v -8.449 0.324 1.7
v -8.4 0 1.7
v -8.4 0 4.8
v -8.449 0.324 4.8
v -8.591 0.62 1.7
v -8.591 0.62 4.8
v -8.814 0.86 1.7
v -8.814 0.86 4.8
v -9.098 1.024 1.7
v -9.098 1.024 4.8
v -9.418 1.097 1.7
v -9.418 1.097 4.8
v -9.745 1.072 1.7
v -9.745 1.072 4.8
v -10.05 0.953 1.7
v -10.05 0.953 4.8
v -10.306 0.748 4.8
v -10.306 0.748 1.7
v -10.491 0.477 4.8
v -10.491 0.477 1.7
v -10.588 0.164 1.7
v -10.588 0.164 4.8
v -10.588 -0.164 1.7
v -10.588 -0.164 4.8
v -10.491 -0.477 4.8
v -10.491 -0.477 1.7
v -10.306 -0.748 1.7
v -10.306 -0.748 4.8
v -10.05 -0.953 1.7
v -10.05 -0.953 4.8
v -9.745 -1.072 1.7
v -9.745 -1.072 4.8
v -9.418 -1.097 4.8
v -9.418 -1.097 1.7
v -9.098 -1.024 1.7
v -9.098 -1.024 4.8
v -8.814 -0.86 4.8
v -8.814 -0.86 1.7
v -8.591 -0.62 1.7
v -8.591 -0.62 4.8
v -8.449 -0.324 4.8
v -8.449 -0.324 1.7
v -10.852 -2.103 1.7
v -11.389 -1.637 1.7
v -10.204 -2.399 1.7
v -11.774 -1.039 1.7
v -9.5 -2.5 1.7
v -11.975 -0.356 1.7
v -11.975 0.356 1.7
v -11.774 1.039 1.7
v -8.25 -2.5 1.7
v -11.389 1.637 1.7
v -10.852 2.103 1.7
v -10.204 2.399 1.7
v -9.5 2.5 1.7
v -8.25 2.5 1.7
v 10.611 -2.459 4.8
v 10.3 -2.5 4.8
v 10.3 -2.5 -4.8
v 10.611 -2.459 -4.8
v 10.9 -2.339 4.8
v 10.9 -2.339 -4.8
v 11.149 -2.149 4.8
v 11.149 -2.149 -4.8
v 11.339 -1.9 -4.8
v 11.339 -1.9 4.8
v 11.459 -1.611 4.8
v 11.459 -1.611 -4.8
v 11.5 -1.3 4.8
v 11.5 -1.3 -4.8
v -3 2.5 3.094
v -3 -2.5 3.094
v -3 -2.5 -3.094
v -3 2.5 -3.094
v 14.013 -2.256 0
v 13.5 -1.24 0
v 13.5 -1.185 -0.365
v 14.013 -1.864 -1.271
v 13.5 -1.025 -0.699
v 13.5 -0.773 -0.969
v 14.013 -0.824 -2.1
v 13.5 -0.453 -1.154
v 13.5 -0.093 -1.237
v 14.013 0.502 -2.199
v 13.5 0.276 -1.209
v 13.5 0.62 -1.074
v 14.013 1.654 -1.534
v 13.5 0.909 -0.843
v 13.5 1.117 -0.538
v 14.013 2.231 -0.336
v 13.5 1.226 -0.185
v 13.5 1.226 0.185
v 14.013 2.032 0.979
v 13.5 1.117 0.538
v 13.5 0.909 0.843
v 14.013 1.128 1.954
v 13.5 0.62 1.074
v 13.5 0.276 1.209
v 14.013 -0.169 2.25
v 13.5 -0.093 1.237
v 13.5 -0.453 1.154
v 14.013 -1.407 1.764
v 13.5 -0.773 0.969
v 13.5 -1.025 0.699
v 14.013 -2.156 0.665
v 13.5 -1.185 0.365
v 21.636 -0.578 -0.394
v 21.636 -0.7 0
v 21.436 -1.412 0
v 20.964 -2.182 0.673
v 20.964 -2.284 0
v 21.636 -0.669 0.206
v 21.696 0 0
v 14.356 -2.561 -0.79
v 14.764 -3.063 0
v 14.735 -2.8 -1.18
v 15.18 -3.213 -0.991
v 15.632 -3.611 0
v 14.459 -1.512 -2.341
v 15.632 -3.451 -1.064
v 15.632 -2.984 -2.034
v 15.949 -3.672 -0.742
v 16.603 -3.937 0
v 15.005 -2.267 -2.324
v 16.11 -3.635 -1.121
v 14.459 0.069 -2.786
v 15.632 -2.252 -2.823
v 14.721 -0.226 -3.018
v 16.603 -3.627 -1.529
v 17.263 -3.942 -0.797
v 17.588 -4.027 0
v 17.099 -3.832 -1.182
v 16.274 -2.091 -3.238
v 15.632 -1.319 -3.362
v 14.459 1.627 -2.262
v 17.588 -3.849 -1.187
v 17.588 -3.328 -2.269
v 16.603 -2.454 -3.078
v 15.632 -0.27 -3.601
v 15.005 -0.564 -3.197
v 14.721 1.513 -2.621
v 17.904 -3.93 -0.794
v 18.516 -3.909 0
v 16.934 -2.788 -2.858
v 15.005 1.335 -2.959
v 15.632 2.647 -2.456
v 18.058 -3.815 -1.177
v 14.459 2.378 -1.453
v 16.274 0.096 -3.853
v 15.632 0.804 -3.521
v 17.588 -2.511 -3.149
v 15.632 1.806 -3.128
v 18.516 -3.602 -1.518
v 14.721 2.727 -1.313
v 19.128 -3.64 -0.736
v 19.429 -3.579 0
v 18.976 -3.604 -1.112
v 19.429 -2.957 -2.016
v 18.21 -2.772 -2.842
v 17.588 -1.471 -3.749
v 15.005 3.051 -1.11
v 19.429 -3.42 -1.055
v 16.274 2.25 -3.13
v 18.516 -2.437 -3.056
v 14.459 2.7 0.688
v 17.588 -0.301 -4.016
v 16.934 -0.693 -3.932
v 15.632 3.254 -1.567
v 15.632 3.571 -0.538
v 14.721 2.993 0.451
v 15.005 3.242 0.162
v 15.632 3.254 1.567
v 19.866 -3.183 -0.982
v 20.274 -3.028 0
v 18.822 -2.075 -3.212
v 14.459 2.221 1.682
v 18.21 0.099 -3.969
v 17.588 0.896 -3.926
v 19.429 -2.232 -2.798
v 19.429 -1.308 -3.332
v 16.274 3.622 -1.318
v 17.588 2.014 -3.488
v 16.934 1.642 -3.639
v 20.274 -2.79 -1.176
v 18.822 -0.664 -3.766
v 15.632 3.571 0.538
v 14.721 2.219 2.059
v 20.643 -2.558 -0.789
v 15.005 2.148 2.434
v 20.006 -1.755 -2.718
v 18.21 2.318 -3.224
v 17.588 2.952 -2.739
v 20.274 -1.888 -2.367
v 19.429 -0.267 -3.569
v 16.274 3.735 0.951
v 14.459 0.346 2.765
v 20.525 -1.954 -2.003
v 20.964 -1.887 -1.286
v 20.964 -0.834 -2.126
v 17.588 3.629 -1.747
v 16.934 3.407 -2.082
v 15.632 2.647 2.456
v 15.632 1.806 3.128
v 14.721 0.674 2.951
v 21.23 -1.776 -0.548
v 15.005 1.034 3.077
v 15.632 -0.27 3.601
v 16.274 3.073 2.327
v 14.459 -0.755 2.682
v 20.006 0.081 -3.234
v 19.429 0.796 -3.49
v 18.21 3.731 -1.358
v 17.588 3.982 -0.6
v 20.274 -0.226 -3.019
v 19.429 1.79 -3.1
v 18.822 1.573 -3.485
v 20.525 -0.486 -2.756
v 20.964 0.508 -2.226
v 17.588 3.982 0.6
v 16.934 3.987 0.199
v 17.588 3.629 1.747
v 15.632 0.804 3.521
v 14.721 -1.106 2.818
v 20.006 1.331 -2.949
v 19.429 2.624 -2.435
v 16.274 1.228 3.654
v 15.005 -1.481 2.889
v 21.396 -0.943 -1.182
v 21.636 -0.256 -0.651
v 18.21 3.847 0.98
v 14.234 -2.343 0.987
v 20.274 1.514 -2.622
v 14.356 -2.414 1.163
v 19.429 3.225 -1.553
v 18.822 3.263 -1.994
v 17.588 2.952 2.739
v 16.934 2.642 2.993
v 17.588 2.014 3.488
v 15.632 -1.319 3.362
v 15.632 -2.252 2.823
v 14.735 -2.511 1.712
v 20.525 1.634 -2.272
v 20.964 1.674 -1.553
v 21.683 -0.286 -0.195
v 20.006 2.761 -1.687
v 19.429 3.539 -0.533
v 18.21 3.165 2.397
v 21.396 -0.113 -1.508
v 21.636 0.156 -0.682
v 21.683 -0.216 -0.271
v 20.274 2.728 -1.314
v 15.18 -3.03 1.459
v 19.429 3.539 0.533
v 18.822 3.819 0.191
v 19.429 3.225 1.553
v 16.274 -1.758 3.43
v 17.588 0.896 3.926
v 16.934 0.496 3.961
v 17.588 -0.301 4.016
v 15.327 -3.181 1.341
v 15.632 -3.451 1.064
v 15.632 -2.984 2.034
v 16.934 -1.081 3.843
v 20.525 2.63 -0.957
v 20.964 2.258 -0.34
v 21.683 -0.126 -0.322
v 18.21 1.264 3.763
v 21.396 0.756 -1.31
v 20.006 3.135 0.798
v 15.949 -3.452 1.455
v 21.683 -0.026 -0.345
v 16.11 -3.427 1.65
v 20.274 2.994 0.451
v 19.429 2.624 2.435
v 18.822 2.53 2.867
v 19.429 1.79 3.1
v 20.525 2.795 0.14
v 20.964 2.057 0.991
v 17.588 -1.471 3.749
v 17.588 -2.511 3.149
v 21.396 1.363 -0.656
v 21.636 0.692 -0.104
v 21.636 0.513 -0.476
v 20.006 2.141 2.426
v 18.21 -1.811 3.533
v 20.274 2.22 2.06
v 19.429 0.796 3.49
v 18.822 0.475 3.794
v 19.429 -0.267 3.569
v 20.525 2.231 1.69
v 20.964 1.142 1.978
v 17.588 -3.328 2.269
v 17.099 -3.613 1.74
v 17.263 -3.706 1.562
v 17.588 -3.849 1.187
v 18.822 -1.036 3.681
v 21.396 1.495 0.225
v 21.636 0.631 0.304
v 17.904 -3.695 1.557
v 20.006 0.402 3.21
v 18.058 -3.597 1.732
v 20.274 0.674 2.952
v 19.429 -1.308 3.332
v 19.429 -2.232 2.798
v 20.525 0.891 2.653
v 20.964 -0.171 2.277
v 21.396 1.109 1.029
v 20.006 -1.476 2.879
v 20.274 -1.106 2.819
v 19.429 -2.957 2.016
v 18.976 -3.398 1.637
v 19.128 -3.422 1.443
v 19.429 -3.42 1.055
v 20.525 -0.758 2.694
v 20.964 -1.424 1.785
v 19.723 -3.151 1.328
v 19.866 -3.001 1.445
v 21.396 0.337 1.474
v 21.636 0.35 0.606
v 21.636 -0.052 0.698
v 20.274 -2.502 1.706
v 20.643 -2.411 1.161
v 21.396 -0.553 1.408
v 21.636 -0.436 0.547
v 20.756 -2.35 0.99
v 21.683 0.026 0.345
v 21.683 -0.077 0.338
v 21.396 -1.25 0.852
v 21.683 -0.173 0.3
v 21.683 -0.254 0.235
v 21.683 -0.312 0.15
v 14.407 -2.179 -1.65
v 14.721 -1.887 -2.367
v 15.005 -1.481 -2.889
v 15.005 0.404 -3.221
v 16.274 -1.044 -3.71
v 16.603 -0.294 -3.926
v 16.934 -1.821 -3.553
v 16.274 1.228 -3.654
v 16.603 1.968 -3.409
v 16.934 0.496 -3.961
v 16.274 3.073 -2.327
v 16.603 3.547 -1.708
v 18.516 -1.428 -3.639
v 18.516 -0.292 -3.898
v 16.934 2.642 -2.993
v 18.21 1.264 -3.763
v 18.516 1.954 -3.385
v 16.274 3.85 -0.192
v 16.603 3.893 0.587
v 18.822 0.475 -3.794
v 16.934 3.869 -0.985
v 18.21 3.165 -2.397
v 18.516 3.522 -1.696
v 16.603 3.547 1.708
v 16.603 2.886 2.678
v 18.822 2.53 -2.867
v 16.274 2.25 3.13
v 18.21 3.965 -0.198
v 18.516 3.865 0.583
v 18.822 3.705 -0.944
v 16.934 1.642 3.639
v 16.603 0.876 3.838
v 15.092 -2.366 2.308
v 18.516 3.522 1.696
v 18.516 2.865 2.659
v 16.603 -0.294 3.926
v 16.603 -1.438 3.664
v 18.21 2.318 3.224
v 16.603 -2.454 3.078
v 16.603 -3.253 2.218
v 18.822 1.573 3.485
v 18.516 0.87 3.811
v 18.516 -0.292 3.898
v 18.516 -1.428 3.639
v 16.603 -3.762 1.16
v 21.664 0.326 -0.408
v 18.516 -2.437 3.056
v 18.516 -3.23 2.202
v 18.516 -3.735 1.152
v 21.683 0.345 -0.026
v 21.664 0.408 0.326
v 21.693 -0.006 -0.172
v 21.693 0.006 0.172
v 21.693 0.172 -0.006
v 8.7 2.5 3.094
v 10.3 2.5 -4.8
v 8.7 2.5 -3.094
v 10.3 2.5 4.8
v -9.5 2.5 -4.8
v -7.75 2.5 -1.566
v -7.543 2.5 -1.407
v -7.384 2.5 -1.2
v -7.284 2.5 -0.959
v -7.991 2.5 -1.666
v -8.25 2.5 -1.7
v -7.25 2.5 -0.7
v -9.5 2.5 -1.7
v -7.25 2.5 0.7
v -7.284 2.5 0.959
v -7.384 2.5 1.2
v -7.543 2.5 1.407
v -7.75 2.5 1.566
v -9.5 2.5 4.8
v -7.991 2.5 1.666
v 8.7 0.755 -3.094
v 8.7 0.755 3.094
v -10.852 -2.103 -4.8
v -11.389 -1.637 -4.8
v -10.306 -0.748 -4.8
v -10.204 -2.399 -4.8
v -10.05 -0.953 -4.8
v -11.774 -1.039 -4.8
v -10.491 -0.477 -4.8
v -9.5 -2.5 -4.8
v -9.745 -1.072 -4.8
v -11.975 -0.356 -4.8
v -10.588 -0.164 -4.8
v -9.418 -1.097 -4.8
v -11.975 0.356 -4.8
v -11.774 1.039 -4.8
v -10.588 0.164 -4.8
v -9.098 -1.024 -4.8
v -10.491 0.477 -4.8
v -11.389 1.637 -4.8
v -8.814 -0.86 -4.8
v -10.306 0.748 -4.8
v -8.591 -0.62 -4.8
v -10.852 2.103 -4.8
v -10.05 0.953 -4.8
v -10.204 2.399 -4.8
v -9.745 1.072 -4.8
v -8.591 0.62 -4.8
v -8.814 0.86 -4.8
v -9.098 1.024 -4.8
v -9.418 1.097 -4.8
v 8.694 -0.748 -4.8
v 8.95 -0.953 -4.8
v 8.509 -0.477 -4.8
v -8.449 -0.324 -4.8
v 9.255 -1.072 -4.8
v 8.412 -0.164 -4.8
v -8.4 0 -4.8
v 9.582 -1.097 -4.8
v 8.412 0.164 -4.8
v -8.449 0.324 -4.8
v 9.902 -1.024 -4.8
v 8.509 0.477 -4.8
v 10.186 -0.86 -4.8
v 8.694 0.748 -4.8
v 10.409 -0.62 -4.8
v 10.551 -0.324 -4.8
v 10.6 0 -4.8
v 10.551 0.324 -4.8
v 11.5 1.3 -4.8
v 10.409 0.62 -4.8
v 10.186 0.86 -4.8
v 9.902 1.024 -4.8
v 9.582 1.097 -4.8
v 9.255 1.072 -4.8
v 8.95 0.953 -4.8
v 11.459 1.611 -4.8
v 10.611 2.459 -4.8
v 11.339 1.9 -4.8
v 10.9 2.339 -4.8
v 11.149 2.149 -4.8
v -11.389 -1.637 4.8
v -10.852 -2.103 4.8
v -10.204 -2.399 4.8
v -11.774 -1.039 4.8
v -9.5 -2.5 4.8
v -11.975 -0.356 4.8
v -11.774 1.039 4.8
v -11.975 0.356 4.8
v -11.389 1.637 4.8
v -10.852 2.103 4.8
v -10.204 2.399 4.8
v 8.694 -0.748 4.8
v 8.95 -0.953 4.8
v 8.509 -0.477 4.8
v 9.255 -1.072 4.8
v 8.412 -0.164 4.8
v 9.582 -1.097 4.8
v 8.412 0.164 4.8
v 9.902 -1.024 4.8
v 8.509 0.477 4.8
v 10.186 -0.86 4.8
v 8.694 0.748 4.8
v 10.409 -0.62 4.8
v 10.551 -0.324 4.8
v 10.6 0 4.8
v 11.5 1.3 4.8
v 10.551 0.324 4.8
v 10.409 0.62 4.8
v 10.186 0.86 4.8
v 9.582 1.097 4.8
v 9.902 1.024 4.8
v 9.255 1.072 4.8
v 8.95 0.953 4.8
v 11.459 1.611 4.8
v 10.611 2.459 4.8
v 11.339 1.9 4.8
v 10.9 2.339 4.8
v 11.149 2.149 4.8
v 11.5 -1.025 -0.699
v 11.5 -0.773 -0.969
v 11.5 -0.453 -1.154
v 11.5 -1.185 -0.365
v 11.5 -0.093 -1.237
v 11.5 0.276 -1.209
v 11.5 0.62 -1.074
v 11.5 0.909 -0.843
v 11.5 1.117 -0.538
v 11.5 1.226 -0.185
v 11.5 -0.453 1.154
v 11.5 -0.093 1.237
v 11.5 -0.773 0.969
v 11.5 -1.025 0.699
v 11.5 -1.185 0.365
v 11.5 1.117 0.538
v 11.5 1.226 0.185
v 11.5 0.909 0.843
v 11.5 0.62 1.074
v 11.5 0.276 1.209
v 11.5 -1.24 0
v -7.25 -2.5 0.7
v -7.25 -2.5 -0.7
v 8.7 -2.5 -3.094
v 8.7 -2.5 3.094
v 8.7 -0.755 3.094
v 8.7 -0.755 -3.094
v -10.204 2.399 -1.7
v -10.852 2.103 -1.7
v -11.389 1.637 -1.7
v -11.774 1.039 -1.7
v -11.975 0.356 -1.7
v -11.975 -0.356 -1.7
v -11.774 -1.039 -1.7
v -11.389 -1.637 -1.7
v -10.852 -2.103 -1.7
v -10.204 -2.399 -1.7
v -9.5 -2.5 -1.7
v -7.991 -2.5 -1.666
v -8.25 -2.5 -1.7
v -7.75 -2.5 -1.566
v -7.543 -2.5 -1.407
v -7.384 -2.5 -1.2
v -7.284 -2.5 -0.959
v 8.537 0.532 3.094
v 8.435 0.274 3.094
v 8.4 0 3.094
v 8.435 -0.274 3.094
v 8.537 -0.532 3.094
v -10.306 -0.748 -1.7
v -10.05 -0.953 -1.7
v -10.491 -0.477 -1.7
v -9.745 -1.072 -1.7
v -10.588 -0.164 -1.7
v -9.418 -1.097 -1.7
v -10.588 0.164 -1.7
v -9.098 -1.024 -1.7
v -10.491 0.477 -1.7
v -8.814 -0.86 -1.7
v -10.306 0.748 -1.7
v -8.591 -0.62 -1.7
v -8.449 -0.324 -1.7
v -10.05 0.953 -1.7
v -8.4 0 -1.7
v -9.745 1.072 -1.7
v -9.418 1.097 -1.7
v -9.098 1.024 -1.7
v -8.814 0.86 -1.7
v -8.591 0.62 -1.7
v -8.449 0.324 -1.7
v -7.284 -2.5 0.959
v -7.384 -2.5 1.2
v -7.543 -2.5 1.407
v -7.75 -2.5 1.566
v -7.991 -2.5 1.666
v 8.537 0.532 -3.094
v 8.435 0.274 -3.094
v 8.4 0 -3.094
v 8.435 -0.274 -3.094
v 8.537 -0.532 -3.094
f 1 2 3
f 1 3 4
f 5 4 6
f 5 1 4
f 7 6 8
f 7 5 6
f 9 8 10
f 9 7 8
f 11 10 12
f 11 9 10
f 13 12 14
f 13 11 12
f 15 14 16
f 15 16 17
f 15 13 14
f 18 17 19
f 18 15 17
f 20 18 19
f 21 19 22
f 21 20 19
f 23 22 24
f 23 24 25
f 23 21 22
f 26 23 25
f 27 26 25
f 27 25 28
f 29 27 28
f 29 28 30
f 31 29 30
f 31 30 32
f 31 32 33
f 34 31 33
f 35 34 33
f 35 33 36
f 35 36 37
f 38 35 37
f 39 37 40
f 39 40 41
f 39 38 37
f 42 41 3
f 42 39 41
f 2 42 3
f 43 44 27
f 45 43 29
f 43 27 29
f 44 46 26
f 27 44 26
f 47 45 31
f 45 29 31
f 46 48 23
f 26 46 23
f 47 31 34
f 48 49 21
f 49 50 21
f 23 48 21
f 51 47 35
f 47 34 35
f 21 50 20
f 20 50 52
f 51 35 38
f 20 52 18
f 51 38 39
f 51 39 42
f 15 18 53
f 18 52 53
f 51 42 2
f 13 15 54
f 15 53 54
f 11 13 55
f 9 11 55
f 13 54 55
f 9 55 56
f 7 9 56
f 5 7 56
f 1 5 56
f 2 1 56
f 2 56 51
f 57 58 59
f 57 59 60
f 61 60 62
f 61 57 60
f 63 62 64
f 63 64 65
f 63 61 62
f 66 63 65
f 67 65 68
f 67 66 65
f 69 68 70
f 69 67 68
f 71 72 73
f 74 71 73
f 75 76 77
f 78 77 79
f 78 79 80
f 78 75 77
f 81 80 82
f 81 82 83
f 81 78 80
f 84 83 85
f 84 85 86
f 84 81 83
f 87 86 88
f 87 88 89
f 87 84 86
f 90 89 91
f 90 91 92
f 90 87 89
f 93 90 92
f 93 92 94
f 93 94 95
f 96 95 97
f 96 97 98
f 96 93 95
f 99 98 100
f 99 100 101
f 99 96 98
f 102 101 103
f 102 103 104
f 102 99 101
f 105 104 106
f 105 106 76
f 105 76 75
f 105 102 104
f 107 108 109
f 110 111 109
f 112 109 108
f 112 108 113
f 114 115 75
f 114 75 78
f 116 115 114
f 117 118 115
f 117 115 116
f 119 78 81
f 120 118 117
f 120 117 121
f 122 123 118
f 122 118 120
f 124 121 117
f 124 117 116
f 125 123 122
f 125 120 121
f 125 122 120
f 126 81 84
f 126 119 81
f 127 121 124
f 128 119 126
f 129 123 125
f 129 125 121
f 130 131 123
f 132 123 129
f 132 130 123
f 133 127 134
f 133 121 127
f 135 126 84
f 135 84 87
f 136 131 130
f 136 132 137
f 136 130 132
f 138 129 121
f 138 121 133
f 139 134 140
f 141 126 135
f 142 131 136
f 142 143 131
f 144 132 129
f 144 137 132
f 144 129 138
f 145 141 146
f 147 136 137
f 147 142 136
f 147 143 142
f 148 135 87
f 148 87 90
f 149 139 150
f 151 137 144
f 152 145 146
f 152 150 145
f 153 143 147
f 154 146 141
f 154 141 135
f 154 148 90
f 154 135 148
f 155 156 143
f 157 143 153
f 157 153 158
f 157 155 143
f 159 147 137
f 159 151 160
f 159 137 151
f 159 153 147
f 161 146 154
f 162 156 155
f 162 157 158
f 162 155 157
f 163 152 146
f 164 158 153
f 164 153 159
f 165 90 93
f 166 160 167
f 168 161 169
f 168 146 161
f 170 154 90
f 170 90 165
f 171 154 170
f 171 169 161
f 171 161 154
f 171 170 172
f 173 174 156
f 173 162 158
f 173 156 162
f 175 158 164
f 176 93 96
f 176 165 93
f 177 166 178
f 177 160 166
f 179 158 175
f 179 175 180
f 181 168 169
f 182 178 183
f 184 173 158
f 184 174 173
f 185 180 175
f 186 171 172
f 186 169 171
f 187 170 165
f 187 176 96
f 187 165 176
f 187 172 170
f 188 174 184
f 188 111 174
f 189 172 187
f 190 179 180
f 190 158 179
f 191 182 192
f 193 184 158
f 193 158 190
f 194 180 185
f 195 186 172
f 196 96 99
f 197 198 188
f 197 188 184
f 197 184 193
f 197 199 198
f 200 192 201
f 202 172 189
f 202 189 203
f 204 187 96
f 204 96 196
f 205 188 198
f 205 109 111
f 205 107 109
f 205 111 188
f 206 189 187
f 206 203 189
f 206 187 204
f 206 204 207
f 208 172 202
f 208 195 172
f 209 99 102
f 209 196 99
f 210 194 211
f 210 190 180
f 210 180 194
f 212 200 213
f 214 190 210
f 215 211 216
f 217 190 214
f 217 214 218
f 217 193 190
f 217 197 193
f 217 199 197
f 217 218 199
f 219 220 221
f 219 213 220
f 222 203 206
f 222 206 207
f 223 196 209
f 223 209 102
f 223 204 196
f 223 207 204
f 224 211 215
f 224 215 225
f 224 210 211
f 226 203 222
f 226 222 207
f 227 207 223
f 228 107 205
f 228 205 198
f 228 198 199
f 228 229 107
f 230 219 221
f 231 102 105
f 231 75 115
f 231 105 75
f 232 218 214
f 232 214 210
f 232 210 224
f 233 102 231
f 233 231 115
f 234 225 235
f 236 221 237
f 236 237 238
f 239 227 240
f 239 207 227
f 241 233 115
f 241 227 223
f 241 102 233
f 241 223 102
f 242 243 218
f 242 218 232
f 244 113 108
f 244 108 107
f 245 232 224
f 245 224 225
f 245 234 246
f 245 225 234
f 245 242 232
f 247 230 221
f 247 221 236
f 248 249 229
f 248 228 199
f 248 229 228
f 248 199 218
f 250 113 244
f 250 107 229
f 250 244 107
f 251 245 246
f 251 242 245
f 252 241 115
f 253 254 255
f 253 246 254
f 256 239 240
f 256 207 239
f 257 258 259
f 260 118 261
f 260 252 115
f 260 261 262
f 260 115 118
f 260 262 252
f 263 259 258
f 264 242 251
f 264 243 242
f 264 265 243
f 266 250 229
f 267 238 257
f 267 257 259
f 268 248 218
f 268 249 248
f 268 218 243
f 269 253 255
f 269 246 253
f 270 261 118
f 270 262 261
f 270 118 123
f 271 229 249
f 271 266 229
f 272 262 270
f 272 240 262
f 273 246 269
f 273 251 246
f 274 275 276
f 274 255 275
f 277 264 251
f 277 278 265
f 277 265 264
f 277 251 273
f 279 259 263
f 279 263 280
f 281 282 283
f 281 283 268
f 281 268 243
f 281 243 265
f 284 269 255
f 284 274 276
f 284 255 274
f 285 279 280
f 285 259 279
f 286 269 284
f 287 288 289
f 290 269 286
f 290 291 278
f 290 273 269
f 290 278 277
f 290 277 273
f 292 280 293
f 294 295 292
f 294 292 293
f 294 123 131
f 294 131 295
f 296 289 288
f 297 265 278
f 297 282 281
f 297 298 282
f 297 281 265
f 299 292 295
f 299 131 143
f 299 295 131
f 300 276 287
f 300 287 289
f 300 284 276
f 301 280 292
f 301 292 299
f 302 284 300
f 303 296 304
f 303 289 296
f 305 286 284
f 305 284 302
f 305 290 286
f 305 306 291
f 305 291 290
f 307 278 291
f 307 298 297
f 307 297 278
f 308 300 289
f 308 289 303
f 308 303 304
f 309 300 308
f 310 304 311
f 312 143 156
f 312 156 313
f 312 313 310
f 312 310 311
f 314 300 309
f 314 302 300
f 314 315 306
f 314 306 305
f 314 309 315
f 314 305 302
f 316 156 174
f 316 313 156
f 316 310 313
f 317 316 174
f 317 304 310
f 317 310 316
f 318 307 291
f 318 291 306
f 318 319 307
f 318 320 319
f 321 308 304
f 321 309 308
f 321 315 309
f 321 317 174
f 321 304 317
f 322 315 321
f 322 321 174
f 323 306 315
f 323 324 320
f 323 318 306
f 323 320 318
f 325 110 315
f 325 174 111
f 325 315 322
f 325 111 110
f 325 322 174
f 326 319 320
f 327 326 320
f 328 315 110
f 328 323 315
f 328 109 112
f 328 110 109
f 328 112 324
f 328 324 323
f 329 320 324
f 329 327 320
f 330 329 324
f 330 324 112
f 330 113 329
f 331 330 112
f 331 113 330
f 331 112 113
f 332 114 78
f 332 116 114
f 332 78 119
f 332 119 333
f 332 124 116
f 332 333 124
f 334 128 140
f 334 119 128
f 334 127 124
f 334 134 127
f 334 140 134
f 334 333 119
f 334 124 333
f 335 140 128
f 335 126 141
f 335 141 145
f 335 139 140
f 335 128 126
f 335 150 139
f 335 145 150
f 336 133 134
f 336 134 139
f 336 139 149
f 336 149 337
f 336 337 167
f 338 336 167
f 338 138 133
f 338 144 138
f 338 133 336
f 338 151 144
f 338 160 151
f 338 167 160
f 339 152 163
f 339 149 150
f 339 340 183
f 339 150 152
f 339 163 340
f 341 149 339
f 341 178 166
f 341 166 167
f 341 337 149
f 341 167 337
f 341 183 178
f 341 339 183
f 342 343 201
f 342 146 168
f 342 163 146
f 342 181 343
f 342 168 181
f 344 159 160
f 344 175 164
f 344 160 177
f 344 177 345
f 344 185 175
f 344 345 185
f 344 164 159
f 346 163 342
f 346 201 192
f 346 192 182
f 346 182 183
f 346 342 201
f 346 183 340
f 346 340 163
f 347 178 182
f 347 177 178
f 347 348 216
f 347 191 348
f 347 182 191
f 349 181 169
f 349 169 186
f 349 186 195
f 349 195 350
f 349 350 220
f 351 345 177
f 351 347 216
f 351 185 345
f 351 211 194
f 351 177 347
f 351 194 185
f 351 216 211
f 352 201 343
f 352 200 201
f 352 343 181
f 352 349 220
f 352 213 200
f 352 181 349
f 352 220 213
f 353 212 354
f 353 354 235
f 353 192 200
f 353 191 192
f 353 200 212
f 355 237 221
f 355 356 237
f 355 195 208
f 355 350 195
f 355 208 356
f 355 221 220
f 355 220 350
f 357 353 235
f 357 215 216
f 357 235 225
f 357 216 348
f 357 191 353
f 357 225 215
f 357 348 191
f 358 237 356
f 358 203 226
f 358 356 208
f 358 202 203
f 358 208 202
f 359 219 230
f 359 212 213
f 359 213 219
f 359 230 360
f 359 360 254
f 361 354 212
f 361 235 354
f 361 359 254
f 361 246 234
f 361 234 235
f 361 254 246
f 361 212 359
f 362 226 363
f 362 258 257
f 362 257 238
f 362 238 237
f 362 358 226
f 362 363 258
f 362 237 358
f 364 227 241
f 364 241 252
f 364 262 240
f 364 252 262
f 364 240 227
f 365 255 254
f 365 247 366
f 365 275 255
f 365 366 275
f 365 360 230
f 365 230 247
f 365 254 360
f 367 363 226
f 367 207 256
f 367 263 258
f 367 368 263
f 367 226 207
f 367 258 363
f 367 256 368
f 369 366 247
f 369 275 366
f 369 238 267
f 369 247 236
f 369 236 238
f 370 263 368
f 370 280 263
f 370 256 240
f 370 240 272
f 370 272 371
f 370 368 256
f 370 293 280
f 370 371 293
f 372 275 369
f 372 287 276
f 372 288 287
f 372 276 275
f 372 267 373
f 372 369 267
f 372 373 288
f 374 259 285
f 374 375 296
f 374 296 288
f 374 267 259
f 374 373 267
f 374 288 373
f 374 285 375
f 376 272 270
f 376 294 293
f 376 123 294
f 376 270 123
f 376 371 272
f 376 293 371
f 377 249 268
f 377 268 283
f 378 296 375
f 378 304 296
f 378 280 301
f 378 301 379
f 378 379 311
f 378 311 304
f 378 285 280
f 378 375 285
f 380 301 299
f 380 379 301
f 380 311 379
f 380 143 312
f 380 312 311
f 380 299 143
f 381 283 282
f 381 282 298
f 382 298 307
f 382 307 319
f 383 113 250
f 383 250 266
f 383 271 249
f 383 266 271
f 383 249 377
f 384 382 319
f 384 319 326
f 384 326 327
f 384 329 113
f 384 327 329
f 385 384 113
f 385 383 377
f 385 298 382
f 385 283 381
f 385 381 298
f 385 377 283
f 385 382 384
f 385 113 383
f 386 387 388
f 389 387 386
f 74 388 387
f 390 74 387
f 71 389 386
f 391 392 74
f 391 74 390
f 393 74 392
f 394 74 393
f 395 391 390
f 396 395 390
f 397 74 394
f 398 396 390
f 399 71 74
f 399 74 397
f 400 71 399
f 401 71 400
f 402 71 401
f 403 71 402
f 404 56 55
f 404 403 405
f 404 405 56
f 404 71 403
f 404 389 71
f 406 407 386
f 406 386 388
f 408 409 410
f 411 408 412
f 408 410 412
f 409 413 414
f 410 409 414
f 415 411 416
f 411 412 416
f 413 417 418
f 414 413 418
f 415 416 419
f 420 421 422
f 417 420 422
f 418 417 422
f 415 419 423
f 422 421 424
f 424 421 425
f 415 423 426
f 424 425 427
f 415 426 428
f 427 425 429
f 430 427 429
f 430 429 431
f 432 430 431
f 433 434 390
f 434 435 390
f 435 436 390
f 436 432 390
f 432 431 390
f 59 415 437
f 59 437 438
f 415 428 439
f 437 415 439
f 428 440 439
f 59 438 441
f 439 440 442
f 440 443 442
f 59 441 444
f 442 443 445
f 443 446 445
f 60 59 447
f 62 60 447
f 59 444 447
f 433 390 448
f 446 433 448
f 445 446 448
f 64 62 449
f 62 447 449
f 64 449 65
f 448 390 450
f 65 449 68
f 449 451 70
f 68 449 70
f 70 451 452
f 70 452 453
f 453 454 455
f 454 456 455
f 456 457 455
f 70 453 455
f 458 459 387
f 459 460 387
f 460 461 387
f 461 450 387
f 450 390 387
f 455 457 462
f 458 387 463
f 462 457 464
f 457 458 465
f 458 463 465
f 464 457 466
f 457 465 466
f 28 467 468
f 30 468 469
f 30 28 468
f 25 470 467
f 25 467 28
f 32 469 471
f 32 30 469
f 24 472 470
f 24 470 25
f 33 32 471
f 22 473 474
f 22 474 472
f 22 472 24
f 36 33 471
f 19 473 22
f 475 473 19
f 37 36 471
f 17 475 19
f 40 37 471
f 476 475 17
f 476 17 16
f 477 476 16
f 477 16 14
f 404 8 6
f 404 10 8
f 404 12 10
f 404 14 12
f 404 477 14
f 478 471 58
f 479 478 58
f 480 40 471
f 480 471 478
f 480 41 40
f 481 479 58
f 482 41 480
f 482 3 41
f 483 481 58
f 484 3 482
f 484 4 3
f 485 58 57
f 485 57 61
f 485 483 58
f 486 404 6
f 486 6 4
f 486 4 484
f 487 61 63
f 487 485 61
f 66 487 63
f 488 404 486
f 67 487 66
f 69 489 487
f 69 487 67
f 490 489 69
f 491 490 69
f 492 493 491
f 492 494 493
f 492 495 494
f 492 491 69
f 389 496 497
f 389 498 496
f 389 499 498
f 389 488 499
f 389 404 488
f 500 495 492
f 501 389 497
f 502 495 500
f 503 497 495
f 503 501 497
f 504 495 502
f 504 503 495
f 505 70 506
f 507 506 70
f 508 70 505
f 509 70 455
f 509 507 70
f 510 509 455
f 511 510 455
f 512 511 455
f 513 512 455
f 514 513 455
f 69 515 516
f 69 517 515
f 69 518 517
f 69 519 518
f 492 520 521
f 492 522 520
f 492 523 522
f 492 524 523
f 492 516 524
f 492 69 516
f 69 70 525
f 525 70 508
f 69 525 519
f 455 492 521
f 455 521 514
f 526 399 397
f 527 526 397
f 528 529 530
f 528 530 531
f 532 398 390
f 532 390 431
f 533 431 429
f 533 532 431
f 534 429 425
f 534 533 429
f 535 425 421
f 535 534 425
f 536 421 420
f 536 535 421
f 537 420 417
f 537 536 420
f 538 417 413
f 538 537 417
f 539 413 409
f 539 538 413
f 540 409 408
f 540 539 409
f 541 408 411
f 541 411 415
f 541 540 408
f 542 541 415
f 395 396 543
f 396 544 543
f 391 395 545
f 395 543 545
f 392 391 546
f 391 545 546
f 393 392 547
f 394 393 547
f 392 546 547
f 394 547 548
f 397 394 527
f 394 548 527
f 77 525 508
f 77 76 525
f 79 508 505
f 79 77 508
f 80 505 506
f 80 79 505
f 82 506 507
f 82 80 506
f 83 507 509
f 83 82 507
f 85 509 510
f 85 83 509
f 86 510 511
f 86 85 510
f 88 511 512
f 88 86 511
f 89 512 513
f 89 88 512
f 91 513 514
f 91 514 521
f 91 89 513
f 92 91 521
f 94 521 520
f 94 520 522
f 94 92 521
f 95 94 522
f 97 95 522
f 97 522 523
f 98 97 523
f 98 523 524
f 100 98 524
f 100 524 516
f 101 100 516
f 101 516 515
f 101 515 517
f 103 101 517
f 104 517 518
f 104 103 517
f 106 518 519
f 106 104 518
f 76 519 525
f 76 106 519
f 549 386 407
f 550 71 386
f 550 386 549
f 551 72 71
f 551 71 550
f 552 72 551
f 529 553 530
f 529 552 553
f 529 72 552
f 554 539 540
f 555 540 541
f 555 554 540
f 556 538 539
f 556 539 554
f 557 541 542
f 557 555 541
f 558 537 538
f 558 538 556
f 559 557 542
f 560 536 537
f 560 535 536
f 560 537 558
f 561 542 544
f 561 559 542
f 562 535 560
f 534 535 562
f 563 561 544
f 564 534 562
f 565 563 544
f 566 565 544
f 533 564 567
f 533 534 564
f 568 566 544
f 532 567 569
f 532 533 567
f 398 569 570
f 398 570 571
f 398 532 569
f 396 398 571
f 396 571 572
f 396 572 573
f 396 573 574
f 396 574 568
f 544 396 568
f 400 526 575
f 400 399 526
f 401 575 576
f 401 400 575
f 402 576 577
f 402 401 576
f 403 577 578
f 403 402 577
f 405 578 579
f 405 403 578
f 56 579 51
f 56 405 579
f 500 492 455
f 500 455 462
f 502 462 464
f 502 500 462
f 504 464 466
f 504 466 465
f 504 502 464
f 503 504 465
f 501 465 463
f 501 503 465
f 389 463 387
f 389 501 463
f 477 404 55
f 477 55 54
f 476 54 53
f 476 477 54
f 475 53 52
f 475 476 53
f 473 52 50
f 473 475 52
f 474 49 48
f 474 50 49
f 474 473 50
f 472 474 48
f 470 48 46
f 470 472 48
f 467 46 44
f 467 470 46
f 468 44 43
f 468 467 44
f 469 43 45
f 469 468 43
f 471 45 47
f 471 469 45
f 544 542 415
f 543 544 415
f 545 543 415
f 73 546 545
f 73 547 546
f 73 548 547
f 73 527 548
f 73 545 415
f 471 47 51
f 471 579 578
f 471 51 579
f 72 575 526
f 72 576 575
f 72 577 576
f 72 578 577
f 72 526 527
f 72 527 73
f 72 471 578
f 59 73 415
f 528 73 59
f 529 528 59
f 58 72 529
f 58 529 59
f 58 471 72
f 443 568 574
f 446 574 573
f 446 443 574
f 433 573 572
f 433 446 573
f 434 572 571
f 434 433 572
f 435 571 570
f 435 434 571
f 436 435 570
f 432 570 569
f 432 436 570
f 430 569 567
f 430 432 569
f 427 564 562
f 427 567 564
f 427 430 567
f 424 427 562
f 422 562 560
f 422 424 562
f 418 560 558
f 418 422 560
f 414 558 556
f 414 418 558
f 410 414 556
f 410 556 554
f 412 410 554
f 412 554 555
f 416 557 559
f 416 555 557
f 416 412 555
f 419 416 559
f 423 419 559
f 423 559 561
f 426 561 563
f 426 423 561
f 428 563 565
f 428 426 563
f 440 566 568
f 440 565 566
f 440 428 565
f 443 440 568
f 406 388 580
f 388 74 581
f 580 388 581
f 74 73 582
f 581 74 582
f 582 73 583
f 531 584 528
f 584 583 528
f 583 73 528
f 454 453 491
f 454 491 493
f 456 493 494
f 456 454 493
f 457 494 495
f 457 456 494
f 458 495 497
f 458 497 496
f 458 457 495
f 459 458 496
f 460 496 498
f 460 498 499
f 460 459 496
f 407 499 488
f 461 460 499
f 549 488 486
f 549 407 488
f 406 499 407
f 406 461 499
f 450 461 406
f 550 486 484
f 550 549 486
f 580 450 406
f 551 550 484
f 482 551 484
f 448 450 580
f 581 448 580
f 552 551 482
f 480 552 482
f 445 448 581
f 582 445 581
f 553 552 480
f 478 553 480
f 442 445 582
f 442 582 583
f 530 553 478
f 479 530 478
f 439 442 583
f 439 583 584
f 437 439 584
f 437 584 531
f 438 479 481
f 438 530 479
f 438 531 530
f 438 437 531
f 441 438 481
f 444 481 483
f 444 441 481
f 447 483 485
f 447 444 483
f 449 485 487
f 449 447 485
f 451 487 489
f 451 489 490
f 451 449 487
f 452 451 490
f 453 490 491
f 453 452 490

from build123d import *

# Parameters (mm, degrees)
SKETCH1_R           = 1.1
BOSS_EXTRUDE1_DEPTH = 4.8
SKETCH2_W           = 11.7
SKETCH2_H           = 6.188
SKETCH2_W_2         = 4.75
SKETCH2_H_2         = 3.4
CUT_EXTRUDE1_DEPTH  = 4.8
FILLET1_R           = 1


with BuildPart() as part:
    # Sketch1 → Boss-Extrude1 (new, symmetric)
    with BuildSketch(Plane.XY):
        with BuildLine():
            Line((-9.5, -2.5), (9.5, -2.5))
            Line((9.5, -2.5), (10.3, -2.5))
            ThreePointArc((10.3, -2.5), (11.148528137, -2.148528137), (11.5, -1.3))
            Line((11.5, -1.3), (11.5, -0.801473335))
            Line((11.5, -0.801473335), (11.5, 1.3))
            ThreePointArc((11.5, 1.3), (11.148528137, 2.148528137), (10.3, 2.5))
            Line((10.3, 2.5), (9.5, 2.5))
            Line((9.5, 2.5), (-9.5, 2.5))
            ThreePointArc((-9.5, 2.5), (-12, 0), (-9.5, -2.5))
        make_face()
        with Locations((-9.5, 0)):
            Circle(SKETCH1_R, mode=Mode.SUBTRACT)
        with Locations((9.5, 0)):
            Circle(SKETCH1_R, mode=Mode.SUBTRACT)
    extrude(amount=BOSS_EXTRUDE1_DEPTH, both=True)

    # Sketch2 → Cut-Extrude1 (cut, symmetric)
    with BuildSketch(Plane(origin=(0, 0, 0), x_dir=(1, 0, 0), z_dir=(0, 1, 0))):
        with Locations((2.85, 0)):
            Rectangle(SKETCH2_W, SKETCH2_H)
        with Locations((-9.625, 0)):
            Rectangle(SKETCH2_W_2, SKETCH2_H_2)
    extrude(amount=CUT_EXTRUDE1_DEPTH, both=True, mode=Mode.SUBTRACT)

    # Sketch6 → Revolve5 (revolve)
    with BuildSketch(Plane.XY):
        with BuildLine():
            Line((11.5, -1.24), (13.5, -1.24))
            add(Edge.make_bspline(
                [(13.5, -1.24), (14.590825895, -4.518170639), (18.155142557, -3.978926497), (21.719459219, -3.439682355), (21.696199677, 0)],
                knots=[3.442238671, 3.442238671, 3.442238671, 4.862711989, 4.862711989, 6.283185307, 6.283185307, 6.283185307], degree=2, weights=[1, 0.758207592, 1, 0.758207592, 1]))
            Line((21.696199677, 0), (11.5, 0))
            Line((11.5, 0), (11.5, -1.24))
        make_face()
    revolve(axis=Axis((11.5, 0, 0), (1, 0, 0)))

    # Fillet1
    fillet1_edges = [part.edges().sort_by_distance(p)[0] for p in [
        (-7.25, 0, 1.7),
        (-7.25, 0, -1.7),
    ]]
    fillet(fillet1_edges, radius=FILLET1_R)


solid = part.part
